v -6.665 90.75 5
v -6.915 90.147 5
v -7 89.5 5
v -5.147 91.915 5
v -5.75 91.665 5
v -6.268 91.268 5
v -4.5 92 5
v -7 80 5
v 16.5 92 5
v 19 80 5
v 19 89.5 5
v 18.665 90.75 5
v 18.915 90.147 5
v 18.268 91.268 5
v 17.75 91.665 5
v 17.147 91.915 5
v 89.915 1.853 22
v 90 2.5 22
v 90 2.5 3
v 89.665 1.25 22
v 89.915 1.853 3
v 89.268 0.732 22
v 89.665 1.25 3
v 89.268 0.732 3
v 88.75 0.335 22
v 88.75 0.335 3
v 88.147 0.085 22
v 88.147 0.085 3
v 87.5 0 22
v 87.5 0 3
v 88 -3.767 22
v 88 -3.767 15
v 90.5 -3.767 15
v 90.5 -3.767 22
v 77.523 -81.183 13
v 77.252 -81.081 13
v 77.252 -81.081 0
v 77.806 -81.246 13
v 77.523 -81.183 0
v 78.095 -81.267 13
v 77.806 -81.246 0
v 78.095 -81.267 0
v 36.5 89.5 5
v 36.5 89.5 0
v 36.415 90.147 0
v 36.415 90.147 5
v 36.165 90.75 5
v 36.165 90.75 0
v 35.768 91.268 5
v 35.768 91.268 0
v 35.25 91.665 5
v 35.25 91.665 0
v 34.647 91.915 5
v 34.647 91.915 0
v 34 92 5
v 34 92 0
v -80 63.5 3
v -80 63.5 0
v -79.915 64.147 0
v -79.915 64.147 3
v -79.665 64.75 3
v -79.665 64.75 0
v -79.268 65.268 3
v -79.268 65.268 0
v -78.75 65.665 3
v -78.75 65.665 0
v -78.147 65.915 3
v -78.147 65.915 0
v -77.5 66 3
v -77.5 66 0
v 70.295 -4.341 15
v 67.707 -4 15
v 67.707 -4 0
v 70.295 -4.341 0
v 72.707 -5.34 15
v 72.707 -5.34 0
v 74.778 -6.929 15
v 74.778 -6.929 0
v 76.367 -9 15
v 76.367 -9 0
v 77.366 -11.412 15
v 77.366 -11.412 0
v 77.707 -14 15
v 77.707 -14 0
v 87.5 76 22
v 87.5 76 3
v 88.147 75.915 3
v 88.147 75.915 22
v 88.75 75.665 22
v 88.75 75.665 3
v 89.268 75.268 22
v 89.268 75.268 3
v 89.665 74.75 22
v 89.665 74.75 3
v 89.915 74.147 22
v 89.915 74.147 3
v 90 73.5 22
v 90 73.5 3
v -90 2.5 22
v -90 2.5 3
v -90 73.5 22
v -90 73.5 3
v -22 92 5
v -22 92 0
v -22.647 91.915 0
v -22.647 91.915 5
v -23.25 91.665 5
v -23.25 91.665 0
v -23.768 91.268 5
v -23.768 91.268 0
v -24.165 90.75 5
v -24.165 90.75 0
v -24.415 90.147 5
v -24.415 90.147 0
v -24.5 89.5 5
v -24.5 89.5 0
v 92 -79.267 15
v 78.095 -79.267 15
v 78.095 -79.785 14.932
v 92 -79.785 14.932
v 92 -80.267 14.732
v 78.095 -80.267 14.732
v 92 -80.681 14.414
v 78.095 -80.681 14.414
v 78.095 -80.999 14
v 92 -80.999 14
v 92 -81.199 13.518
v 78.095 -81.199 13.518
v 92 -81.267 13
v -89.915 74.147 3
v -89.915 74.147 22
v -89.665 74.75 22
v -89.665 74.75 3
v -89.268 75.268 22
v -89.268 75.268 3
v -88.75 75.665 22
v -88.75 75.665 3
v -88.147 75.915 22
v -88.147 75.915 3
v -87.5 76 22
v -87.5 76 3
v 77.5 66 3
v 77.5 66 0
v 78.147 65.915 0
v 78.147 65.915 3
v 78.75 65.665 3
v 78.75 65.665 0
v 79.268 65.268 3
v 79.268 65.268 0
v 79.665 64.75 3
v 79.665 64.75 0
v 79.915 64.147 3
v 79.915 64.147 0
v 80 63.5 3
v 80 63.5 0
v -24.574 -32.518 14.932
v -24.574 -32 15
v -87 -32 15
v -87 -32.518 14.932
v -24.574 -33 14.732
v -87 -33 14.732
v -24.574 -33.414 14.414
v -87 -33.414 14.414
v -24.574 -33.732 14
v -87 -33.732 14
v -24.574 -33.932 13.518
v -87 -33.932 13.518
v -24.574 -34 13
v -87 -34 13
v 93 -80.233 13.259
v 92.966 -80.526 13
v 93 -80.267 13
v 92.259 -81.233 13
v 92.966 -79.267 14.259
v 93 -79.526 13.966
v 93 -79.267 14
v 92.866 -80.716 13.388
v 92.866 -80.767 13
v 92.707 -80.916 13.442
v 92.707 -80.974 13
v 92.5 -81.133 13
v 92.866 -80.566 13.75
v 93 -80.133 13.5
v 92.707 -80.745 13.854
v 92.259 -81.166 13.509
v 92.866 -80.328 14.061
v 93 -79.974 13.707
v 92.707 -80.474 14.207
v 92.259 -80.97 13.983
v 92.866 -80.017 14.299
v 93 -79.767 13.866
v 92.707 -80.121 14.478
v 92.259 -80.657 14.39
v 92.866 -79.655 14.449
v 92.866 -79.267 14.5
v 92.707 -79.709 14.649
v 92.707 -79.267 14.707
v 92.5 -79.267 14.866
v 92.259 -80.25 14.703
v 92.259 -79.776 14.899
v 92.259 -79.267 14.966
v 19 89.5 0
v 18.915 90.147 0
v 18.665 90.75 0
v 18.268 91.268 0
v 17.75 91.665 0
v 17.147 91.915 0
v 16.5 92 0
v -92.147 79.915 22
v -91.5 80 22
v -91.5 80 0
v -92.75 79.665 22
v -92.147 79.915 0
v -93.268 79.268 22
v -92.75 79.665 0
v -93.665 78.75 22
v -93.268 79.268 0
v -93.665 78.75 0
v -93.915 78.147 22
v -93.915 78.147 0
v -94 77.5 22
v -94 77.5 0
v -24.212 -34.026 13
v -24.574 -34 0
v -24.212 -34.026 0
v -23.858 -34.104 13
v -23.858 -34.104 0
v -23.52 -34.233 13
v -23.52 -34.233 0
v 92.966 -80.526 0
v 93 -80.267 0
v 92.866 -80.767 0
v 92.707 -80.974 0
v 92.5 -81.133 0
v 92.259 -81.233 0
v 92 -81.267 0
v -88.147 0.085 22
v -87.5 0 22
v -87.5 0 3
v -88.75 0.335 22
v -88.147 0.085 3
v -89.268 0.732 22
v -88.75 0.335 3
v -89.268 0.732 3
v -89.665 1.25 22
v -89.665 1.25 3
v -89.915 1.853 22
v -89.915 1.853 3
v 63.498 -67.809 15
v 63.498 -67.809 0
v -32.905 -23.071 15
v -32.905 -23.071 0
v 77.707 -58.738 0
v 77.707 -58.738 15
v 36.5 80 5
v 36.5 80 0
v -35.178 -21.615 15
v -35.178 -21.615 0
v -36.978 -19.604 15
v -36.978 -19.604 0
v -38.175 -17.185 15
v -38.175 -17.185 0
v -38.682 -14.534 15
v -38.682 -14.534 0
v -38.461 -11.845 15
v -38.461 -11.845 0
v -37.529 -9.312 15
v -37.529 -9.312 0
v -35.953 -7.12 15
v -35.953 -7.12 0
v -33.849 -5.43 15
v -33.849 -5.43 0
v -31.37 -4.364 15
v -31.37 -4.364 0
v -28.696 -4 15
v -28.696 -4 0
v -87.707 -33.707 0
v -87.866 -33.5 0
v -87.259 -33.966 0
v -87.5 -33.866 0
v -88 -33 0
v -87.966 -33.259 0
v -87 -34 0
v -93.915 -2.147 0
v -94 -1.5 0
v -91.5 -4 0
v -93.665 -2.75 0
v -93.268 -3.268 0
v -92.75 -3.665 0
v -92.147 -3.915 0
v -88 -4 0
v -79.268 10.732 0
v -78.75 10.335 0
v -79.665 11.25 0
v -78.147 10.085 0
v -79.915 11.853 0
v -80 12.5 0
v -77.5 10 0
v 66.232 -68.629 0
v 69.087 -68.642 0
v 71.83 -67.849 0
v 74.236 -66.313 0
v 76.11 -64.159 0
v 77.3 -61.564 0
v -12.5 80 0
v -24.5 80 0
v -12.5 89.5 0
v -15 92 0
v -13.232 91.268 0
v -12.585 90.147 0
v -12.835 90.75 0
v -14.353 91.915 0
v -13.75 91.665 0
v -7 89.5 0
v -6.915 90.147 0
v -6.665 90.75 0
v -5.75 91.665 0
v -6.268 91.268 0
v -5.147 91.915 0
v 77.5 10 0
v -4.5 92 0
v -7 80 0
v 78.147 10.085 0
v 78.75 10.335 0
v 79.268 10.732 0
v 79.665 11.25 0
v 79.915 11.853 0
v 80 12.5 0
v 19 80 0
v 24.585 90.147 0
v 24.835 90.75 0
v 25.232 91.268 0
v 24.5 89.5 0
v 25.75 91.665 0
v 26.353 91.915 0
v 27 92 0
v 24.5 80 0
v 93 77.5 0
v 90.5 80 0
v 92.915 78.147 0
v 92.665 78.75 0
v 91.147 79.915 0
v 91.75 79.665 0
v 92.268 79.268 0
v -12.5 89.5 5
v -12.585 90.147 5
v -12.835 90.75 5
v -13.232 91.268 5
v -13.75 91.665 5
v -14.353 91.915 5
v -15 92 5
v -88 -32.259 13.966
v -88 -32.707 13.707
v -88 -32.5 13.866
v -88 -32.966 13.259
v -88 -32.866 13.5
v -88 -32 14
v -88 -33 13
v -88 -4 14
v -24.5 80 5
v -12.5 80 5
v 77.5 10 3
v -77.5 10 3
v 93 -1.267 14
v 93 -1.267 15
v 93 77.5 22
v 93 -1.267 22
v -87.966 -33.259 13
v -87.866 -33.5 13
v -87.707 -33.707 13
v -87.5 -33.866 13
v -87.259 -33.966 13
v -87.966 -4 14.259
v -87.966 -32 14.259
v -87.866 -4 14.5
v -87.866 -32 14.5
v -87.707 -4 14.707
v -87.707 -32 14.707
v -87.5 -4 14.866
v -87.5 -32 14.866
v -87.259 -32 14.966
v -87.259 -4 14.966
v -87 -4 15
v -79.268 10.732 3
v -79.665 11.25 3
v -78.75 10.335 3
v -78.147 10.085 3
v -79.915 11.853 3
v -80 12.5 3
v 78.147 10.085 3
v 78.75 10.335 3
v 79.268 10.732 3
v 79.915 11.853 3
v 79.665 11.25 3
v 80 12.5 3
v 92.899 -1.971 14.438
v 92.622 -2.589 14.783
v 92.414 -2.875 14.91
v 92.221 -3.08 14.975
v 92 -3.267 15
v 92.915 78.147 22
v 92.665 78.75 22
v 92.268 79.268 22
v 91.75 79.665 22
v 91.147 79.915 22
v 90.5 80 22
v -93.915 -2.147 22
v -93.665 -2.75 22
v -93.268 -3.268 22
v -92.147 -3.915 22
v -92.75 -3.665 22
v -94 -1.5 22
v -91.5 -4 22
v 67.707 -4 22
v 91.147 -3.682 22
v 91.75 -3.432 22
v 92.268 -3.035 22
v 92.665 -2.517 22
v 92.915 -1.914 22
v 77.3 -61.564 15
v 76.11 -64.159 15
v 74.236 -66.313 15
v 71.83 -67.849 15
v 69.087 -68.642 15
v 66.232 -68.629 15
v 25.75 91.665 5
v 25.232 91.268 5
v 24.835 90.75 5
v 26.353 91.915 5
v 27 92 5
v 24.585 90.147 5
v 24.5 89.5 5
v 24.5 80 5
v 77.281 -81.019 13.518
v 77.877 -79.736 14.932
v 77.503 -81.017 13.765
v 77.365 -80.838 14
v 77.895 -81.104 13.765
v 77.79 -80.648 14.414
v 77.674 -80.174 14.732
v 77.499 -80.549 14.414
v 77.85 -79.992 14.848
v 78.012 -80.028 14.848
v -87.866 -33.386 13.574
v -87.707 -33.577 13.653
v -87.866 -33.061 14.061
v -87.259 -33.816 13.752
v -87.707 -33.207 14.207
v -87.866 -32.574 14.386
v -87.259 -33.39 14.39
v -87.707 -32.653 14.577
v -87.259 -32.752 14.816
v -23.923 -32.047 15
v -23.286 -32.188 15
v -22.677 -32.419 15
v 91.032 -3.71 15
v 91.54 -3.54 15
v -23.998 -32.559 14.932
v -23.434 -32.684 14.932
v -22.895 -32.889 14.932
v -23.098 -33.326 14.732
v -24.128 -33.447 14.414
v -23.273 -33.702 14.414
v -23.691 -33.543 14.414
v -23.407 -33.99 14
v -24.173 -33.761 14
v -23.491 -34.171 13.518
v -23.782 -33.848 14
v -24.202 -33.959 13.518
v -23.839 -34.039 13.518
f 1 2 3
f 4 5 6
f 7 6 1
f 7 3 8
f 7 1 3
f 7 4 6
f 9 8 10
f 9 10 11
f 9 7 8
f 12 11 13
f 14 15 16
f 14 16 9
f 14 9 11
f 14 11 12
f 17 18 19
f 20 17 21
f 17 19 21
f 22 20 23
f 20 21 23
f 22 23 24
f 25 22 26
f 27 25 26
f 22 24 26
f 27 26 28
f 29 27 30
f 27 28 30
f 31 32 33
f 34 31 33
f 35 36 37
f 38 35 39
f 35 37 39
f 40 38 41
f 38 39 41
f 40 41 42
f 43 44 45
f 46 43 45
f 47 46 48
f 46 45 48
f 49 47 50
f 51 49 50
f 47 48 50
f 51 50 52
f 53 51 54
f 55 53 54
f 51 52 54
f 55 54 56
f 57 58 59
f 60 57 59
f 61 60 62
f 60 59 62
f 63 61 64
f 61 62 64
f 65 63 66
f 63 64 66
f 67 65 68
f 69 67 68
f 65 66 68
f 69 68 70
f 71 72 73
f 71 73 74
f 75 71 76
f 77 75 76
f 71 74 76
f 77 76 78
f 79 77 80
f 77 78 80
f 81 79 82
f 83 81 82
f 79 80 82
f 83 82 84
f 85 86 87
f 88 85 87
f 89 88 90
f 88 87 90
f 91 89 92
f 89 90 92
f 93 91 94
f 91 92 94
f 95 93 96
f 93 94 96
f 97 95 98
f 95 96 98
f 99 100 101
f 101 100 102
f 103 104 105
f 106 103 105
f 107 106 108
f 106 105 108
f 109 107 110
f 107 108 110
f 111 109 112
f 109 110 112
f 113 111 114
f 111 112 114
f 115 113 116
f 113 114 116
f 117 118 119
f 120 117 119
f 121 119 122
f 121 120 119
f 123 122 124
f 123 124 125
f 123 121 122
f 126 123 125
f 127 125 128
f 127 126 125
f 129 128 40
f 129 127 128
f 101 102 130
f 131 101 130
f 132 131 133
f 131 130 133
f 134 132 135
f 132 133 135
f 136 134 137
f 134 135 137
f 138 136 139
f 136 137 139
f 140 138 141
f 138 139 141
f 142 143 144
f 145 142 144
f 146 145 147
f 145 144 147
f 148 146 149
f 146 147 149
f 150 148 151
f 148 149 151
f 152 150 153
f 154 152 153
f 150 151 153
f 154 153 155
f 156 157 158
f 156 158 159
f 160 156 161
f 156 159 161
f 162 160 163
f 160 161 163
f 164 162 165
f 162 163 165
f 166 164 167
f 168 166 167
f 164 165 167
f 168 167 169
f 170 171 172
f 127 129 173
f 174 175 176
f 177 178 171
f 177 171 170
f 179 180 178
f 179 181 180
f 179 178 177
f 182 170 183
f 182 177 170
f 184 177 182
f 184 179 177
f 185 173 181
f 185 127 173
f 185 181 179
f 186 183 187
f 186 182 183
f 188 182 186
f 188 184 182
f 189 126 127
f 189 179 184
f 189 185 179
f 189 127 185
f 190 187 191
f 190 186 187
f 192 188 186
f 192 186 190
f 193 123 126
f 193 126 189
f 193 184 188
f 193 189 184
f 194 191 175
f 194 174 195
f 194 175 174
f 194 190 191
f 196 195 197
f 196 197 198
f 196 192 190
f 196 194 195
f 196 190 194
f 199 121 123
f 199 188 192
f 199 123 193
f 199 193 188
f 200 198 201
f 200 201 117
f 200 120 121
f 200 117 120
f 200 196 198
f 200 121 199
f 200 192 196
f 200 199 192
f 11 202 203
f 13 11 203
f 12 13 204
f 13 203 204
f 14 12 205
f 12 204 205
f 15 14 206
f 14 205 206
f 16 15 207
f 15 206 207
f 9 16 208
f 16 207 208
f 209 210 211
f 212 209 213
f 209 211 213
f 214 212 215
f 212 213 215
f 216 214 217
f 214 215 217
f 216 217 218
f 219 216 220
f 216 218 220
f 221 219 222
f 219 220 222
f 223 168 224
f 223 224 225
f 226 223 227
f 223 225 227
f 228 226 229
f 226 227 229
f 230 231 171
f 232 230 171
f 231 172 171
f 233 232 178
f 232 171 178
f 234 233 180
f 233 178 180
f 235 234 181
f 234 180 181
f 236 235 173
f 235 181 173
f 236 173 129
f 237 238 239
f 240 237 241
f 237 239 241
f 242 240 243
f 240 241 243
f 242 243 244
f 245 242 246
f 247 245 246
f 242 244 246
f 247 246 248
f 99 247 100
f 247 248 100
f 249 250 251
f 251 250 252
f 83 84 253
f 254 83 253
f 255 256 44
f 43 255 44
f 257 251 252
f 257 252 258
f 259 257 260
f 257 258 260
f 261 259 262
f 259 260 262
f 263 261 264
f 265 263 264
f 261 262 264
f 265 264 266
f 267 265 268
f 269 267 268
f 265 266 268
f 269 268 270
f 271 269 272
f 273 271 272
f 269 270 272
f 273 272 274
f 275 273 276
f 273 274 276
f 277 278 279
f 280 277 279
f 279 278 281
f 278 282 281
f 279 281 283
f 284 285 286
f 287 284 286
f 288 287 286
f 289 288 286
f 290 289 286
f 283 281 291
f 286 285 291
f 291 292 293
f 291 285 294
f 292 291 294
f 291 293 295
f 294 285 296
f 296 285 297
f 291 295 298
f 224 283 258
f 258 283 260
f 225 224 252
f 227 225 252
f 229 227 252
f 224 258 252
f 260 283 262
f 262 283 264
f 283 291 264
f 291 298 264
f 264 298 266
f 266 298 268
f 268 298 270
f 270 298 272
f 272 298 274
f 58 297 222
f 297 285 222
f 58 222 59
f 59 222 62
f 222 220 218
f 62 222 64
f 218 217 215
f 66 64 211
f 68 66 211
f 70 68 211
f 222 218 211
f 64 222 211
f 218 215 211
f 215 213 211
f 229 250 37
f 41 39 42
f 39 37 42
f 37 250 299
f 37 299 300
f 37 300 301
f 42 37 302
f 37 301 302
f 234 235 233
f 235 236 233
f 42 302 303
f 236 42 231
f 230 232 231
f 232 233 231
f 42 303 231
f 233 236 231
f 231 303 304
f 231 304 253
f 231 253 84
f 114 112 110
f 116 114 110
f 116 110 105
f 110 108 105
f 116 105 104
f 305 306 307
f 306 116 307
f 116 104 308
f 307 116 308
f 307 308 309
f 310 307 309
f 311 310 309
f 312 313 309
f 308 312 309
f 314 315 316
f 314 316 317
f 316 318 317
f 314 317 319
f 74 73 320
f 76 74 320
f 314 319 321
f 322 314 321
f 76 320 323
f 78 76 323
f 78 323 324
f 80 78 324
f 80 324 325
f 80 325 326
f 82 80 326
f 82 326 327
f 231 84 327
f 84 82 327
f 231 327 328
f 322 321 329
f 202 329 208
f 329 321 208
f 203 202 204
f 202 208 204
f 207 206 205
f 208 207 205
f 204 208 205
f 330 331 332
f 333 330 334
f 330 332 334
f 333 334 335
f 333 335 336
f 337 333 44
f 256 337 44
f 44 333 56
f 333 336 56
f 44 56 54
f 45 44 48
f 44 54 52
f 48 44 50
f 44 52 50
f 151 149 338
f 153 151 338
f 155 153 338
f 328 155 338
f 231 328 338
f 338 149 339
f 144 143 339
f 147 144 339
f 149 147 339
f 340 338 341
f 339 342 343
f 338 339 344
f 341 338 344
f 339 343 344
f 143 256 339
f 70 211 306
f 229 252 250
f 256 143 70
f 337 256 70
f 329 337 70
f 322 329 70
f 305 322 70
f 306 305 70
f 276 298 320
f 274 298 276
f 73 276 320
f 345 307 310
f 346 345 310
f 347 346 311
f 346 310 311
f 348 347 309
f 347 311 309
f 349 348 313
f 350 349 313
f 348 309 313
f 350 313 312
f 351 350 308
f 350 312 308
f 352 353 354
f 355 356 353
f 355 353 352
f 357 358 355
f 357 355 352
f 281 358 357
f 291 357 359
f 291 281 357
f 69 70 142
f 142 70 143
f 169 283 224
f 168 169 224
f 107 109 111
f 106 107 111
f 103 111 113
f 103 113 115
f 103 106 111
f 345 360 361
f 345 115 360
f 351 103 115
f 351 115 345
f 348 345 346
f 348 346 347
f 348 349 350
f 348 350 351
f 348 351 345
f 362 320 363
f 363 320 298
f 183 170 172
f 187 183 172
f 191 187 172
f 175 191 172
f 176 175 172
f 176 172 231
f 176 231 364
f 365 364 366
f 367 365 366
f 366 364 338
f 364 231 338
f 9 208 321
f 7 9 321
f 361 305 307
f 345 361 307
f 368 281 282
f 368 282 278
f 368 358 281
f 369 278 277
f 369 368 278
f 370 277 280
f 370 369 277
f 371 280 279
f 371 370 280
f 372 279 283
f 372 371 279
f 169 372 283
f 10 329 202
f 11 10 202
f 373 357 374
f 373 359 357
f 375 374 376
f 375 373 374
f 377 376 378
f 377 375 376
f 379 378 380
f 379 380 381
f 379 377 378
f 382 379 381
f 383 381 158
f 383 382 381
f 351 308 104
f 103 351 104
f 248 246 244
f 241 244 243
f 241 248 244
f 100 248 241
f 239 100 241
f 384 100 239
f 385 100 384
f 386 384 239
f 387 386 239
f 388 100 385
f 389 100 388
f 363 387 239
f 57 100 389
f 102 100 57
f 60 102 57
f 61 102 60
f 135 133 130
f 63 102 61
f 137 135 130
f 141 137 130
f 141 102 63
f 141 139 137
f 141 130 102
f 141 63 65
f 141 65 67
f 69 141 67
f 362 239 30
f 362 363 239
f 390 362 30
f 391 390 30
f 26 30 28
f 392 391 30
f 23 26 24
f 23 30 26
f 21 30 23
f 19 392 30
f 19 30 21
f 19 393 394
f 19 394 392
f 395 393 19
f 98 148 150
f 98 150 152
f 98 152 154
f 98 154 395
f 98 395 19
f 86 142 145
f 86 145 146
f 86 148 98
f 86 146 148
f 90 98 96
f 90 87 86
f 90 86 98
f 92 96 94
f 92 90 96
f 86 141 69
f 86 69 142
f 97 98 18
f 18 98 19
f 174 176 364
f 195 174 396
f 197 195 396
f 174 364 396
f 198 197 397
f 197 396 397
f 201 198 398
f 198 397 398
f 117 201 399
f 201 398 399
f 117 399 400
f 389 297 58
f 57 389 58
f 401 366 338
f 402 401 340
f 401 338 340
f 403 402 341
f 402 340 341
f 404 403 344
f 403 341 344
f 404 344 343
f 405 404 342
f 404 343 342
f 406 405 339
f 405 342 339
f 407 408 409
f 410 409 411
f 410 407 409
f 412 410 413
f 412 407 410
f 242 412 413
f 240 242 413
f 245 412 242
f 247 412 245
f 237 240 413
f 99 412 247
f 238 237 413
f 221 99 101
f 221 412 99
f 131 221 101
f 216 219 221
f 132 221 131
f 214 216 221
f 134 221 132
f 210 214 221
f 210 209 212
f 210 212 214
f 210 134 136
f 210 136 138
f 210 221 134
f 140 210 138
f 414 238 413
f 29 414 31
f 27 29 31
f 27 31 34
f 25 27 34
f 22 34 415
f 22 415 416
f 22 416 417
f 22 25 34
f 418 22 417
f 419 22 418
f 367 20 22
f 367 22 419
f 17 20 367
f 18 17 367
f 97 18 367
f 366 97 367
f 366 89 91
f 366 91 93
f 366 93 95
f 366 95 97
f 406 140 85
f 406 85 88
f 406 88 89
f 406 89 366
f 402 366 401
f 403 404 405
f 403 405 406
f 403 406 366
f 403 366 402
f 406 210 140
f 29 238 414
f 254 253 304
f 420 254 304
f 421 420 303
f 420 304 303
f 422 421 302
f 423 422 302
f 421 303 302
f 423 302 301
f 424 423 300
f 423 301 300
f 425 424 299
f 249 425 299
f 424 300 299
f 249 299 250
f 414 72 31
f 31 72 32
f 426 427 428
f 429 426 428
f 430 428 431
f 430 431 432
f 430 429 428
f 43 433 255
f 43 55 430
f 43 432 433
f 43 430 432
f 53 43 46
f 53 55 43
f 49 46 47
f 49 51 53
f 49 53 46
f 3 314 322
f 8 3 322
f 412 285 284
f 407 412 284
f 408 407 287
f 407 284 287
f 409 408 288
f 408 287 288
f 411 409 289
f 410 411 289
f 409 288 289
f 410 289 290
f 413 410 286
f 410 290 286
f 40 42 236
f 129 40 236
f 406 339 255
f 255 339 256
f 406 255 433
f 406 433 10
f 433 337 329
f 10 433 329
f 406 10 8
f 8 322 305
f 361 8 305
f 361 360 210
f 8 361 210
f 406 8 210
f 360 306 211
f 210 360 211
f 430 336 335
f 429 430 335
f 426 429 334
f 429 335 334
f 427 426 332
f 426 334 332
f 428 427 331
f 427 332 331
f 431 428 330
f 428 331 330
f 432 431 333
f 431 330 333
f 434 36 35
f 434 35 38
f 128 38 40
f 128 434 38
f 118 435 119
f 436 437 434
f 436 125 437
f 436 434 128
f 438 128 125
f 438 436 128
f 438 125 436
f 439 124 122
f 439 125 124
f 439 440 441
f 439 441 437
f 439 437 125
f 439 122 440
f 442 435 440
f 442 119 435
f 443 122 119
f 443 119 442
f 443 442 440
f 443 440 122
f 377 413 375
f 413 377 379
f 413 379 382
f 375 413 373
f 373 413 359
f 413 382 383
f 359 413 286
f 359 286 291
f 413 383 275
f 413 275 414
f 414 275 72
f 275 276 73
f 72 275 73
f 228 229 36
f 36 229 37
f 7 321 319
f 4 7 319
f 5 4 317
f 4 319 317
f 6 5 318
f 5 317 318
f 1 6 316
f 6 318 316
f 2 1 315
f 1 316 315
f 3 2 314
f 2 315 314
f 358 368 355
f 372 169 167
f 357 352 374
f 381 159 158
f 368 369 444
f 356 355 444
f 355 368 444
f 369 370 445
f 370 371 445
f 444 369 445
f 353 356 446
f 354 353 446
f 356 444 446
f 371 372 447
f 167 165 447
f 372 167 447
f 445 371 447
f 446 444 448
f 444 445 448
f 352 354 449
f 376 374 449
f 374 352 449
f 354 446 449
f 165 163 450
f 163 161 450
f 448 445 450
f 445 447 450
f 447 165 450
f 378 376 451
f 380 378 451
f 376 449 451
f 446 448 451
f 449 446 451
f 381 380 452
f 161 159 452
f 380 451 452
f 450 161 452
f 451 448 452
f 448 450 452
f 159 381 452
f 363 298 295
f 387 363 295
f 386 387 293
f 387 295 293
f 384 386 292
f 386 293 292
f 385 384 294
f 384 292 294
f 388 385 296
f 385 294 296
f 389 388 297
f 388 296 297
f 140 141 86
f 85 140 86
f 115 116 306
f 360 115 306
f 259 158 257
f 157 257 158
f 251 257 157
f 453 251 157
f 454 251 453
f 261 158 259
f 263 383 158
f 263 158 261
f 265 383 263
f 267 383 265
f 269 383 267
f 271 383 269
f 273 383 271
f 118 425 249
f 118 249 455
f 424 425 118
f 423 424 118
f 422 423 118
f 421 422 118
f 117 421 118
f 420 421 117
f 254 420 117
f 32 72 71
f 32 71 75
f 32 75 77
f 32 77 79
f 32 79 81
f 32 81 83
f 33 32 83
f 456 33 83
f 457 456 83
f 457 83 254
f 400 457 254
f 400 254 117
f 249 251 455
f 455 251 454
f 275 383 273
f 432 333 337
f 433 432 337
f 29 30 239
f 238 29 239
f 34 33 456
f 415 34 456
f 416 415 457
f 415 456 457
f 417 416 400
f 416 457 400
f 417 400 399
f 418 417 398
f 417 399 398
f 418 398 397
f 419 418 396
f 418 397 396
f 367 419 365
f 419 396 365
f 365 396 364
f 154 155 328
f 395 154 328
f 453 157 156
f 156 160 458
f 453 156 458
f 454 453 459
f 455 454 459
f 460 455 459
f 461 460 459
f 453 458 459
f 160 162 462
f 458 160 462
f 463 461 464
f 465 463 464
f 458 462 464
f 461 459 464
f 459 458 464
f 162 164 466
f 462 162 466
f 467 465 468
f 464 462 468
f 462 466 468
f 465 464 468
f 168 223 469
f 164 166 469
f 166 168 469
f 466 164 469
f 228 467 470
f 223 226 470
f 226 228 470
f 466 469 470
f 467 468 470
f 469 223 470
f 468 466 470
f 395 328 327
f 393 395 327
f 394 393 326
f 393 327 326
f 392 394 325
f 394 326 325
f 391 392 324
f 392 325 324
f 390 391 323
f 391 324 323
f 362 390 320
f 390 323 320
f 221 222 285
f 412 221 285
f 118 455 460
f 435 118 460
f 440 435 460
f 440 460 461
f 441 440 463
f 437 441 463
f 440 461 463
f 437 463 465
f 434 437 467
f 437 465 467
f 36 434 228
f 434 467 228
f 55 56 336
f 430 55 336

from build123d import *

# Parameters (mm, degrees)
F1_DEPTH     = 22
F2_DEPTH     = 3
F3_DEPTH     = 15
F0_W         = 15
F0_H         = 30
F4_DEPTH     = 15
F5_R         = 2
F6_T1_DEPTH  = 111.1292207426
F6_T3_DEPTH  = 68.4264144678
F6_T5_DEPTH  = 14.1054111362
F6_T10_DEPTH = 2
F6_T14_ANGLE = 24.9330990778
F7_R         = 1
F8_R         = 1
F9_DEPTH     = 5


# Not quite as in the source:
# - a fillet or chamfer that OpenCascade refuses, or shapes differently, is made with other operations: its cross-section is extruded or revolved along the edge and cut away or added
# - a feature names something its author has since deleted; it is built from what else it names


with BuildPart() as f1:
    # F0 (on Top) → F1 (new body)
    with BuildSketch(Plane.XY):
        with BuildLine():
            ThreePointArc((93, 77.5), (92.267766953, 79.267766953), (90.5, 80))
            Line((90.5, 80), (36.5, 80))
            Line((36.5, 80), (24.5, 80))
            Line((24.5, 80), (19, 80))
            Line((19, 80), (-7, 80))
            Line((-7, 80), (-12.5, 80))
            Line((-12.5, 80), (-24.5, 80))
            Line((-24.5, 80), (-74, 80))
            Line((-74, 80), (-91.5, 80))
            ThreePointArc((-91.5, 80), (-93.267766953, 79.267766953), (-94, 77.5))
            Line((-94, 77.5), (-94, 76))
            Line((-94, 76), (-94, 0))
            Line((-94, 0), (-94, -1.5))
            ThreePointArc((-94, -1.5), (-93.267766953, -3.267766953), (-91.5, -4))
            Line((-91.5, -4), (-88, -4))
            Line((-88, -4), (-73, -4))
            Line((-73, -4), (-28.6959191337, -4))
            Line((-28.6959191337, -4), (67.7072161436, -4))
            Line((67.7072161436, -4), (88, -3.7670015892))
            Line((88, -3.7670015892), (90.5, -3.7670015892))
            ThreePointArc((90.5, -3.7670015892), (92.267766953, -3.0347685421), (93, -1.2670015892))
            Line((93, -1.2670015892), (93, 0))
            Line((93, 0), (93, 76))
            Line((93, 76), (93, 77.5))
        make_face()
        with BuildLine():
            ThreePointArc((90, 2.5), (89.267766953, 0.732233047), (87.5, 0))
            Line((87.5, 0), (-87.5, 0))
            ThreePointArc((-87.5, 0), (-89.267766953, 0.732233047), (-90, 2.5))
            Line((-90, 2.5), (-90, 73.5))
            ThreePointArc((-90, 73.5), (-89.267766953, 75.267766953), (-87.5, 76))
            Line((-87.5, 76), (87.5, 76))
            ThreePointArc((87.5, 76), (89.267766953, 75.267766953), (90, 73.5))
            Line((90, 73.5), (90, 2.5))
        make_face(mode=Mode.SUBTRACT)
    extrude(amount=F1_DEPTH)

    # F0 (on Top) → F2 (join)
    with BuildSketch(Plane.XY):
        with BuildLine():
            Line((-87.5, 0), (87.5, 0))
            ThreePointArc((87.5, 0), (89.267766953, 0.732233047), (90, 2.5))
            Line((90, 2.5), (90, 73.5))
            ThreePointArc((90, 73.5), (89.267766953, 75.267766953), (87.5, 76))
            Line((87.5, 76), (-87.5, 76))
            ThreePointArc((-87.5, 76), (-89.267766953, 75.267766953), (-90, 73.5))
            Line((-90, 73.5), (-90, 2.5))
            ThreePointArc((-90, 2.5), (-89.267766953, 0.732233047), (-87.5, 0))
        make_face()
        with BuildLine():
            Line((-77.5, 66), (77.5, 66))
            ThreePointArc((77.5, 66), (79.267766953, 65.267766953), (80, 63.5))
            Line((80, 63.5), (80, 12.5))
            ThreePointArc((80, 12.5), (79.267766953, 10.732233047), (77.5, 10))
            Line((77.5, 10), (-77.5, 10))
            ThreePointArc((-77.5, 10), (-79.267766953, 10.732233047), (-80, 12.5))
            Line((-80, 12.5), (-80, 63.5))
            ThreePointArc((-80, 63.5), (-79.267766953, 65.267766953), (-77.5, 66))
        make_face(mode=Mode.SUBTRACT)
    extrude(amount=F2_DEPTH)

    # F0 (on Top) → F3 (join)
    with BuildSketch(Plane.XY):
        with BuildLine():
            Line((93, -81.2670015892), (93, -1.2670015892))
            ThreePointArc((93, -1.2670015892), (92.267766953, -3.0347685421), (90.5, -3.7670015892))
            Line((90.5, -3.7670015892), (88, -3.7670015892))
            Line((88, -3.7670015892), (67.7072161436, -4))
            ThreePointArc((67.7072161436, -4), (74.7782839555, -6.9289321881), (77.7072161436, -14))
            Line((77.7072161436, -14), (77.7072161436, -58.7379819401))
            ThreePointArc((77.7072161436, -58.7379819401), (73.0879609173, -67.1669549309), (63.4976990076, -67.8088124137))
            Line((63.4976990076, -67.8088124137), (-32.9054362697, -23.0708304737))
            ThreePointArc((-32.9054362697, -23.0708304737), (-38.4608642113, -11.8445771571), (-28.6959191337, -4))
            Line((-28.6959191337, -4), (-73, -4))
            Line((-73, -4), (-73, -34))
            Line((-73, -34), (-24.5735855322, -34))
            ThreePointArc((-24.5735855322, -34), (-24.033911544, -34.0589444934), (-23.5196862036, -34.2329984108))
            Line((-23.5196862036, -34.2329984108), (77.653316815, -81.2670015892))
            Line((77.653316815, -81.2670015892), (93, -81.2670015892))
        make_face()
    extrude(amount=F3_DEPTH)

    # F0 (on Top) → F4 (join)
    with BuildSketch(Plane.XY):
        with Locations((-80.5, -19)):
            Rectangle(F0_W, F0_H)
    extrude(amount=F4_DEPTH)

    # F5
    f5_edges = [f1.edges().sort_by_distance(p)[0] for p in [
        (85.326658, -81.267002, 15),
    ]]
    fillet(f5_edges, radius=F5_R)

    # F6: fillet of radius 2 on 4 edges, made by hand

    # F6_s2 → F6_t1 (cut)
    with BuildSketch(Plane(origin=(-6.2536714965, 2.9072499211, 0), x_dir=(0, 0, 1), z_dir=(0.9068006357, -0.4215597314, 0))):
        with BuildLine():
            ThreePointArc((15, 38.9574573188), (14.4142135624, 40.3716708812), (13, 40.9574573188))
            Line((13, 40.9574573188), (15, 40.9574573188))
            Line((15, 40.9574573188), (15, 38.9574573188))
        make_face()
    extrude(amount=F6_T1_DEPTH, mode=Mode.SUBTRACT)

    # F6_s4 → F6_t3 (cut)
    with BuildSketch(Plane.YZ.offset(-93)):
        with BuildLine():
            ThreePointArc((-32, 15), (-33.4142135624, 14.4142135624), (-34, 13))
            Line((-34, 13), (-34, 15))
            Line((-34, 15), (-32, 15))
        make_face()
    extrude(amount=F6_T3_DEPTH, mode=Mode.SUBTRACT)

    # F6_s6 → F6_t5 (cut)
    with BuildSketch(Plane.XY.offset(-1.1054111362)):
        with BuildLine():
            ThreePointArc((77.2523618067, -81.0806028605), (77.6637420789, -81.2198459945), (78.0954812695, -81.2670015892))
            Line((78.0954812695, -81.2670015892), (77.653316815, -81.2670015892))
            Line((77.653316815, -81.2670015892), (77.2523618067, -81.0806028605))
        make_face()
    extrude(amount=F6_T5_DEPTH, mode=Mode.SUBTRACT)


with BuildPart() as f6_tool8:
    # F6_s9 → F6_t10 (new body)
    with BuildSketch(Plane.XY.offset(13)):
        Polygon((78.0954812695, -79.2670015892), (78.0954812695, -81.2670015892), (77.653316815, -81.2670015892), (77.2523618067, -81.0806028605), align=None)
    extrude(amount=F6_T10_DEPTH)

    # F6_s11 → F6_t12 (revolve, cut)
    with BuildSketch(Plane(origin=(78.0954812695, -79.2670015892, 13), x_dir=(0.2158695953, 0.9764222027, 0), z_dir=(0.9764222027, -0.2158695953, 0))):
        with BuildLine():
            ThreePointArc((0, -2), (2, 0), (0, 2))
            Line((0, 2), (0, -2))
        make_face()
    revolve(axis=Axis((78.0954812695, -79.2670015892, 13), (0, 0, 1)), mode=Mode.SUBTRACT)


with BuildPart() as f1_1:
    add(f1.part)

    # F6_t7: cut F6_tool8
    add(f6_tool8.part, mode=Mode.SUBTRACT)

    # F6_s13 → F6_t14 (revolve, cut)
    with BuildSketch(Plane.YZ.offset(-24.5735855322)):
        with BuildLine():
            ThreePointArc((-32, 15), (-33.4142135624, 14.4142135624), (-34, 13))
            Line((-34, 13), (-34, 15))
            Line((-34, 15), (-32, 15))
        make_face()
    revolve(axis=Axis((-24.5735855322, -36.5, 15), (0, 0, -1)), revolution_arc=F6_T14_ANGLE, mode=Mode.SUBTRACT)

    # F7
    f7_edges = [f1_1.edges().sort_by_distance(p)[0] for p in [
        (93, -81.267002, 6.5),
    ]]
    fillet(f7_edges, radius=F7_R)

    # F8
    f8_edges = [f1_1.edges().sort_by_distance(p)[0] for p in [
        (-88, -34, 6.5),
        (-88, -18, 15),
        (-88, -33.414214, 14.414214),
    ]]
    fillet(f8_edges, radius=F8_R)

    # F0 (on Top) → F9 (join)
    with BuildSketch(Plane.XY):
        with BuildLine():
            Line((-24.5, 80), (-12.5, 80))
            Line((-12.5, 80), (-12.5, 89.5))
            ThreePointArc((-12.5, 89.5), (-13.232233047, 91.267766953), (-15, 92))
            Line((-15, 92), (-22, 92))
            ThreePointArc((-22, 92), (-23.767766953, 91.267766953), (-24.5, 89.5))
            Line((-24.5, 89.5), (-24.5, 80))
        make_face()
        with BuildLine():
            Line((-7, 80), (19, 80))
            Line((19, 80), (19, 89.5))
            ThreePointArc((19, 89.5), (18.267766953, 91.267766953), (16.5, 92))
            Line((16.5, 92), (-4.5, 92))
            ThreePointArc((-4.5, 92), (-6.267766953, 91.267766953), (-7, 89.5))
            Line((-7, 89.5), (-7, 80))
        make_face()
        with BuildLine():
            Line((24.5, 80), (36.5, 80))
            Line((36.5, 80), (36.5, 89.5))
            ThreePointArc((36.5, 89.5), (35.767766953, 91.267766953), (34, 92))
            Line((34, 92), (27, 92))
            ThreePointArc((27, 92), (25.232233047, 91.267766953), (24.5, 89.5))
            Line((24.5, 89.5), (24.5, 80))
        make_face()
    extrude(amount=F9_DEPTH)


solid = f1_1.part
